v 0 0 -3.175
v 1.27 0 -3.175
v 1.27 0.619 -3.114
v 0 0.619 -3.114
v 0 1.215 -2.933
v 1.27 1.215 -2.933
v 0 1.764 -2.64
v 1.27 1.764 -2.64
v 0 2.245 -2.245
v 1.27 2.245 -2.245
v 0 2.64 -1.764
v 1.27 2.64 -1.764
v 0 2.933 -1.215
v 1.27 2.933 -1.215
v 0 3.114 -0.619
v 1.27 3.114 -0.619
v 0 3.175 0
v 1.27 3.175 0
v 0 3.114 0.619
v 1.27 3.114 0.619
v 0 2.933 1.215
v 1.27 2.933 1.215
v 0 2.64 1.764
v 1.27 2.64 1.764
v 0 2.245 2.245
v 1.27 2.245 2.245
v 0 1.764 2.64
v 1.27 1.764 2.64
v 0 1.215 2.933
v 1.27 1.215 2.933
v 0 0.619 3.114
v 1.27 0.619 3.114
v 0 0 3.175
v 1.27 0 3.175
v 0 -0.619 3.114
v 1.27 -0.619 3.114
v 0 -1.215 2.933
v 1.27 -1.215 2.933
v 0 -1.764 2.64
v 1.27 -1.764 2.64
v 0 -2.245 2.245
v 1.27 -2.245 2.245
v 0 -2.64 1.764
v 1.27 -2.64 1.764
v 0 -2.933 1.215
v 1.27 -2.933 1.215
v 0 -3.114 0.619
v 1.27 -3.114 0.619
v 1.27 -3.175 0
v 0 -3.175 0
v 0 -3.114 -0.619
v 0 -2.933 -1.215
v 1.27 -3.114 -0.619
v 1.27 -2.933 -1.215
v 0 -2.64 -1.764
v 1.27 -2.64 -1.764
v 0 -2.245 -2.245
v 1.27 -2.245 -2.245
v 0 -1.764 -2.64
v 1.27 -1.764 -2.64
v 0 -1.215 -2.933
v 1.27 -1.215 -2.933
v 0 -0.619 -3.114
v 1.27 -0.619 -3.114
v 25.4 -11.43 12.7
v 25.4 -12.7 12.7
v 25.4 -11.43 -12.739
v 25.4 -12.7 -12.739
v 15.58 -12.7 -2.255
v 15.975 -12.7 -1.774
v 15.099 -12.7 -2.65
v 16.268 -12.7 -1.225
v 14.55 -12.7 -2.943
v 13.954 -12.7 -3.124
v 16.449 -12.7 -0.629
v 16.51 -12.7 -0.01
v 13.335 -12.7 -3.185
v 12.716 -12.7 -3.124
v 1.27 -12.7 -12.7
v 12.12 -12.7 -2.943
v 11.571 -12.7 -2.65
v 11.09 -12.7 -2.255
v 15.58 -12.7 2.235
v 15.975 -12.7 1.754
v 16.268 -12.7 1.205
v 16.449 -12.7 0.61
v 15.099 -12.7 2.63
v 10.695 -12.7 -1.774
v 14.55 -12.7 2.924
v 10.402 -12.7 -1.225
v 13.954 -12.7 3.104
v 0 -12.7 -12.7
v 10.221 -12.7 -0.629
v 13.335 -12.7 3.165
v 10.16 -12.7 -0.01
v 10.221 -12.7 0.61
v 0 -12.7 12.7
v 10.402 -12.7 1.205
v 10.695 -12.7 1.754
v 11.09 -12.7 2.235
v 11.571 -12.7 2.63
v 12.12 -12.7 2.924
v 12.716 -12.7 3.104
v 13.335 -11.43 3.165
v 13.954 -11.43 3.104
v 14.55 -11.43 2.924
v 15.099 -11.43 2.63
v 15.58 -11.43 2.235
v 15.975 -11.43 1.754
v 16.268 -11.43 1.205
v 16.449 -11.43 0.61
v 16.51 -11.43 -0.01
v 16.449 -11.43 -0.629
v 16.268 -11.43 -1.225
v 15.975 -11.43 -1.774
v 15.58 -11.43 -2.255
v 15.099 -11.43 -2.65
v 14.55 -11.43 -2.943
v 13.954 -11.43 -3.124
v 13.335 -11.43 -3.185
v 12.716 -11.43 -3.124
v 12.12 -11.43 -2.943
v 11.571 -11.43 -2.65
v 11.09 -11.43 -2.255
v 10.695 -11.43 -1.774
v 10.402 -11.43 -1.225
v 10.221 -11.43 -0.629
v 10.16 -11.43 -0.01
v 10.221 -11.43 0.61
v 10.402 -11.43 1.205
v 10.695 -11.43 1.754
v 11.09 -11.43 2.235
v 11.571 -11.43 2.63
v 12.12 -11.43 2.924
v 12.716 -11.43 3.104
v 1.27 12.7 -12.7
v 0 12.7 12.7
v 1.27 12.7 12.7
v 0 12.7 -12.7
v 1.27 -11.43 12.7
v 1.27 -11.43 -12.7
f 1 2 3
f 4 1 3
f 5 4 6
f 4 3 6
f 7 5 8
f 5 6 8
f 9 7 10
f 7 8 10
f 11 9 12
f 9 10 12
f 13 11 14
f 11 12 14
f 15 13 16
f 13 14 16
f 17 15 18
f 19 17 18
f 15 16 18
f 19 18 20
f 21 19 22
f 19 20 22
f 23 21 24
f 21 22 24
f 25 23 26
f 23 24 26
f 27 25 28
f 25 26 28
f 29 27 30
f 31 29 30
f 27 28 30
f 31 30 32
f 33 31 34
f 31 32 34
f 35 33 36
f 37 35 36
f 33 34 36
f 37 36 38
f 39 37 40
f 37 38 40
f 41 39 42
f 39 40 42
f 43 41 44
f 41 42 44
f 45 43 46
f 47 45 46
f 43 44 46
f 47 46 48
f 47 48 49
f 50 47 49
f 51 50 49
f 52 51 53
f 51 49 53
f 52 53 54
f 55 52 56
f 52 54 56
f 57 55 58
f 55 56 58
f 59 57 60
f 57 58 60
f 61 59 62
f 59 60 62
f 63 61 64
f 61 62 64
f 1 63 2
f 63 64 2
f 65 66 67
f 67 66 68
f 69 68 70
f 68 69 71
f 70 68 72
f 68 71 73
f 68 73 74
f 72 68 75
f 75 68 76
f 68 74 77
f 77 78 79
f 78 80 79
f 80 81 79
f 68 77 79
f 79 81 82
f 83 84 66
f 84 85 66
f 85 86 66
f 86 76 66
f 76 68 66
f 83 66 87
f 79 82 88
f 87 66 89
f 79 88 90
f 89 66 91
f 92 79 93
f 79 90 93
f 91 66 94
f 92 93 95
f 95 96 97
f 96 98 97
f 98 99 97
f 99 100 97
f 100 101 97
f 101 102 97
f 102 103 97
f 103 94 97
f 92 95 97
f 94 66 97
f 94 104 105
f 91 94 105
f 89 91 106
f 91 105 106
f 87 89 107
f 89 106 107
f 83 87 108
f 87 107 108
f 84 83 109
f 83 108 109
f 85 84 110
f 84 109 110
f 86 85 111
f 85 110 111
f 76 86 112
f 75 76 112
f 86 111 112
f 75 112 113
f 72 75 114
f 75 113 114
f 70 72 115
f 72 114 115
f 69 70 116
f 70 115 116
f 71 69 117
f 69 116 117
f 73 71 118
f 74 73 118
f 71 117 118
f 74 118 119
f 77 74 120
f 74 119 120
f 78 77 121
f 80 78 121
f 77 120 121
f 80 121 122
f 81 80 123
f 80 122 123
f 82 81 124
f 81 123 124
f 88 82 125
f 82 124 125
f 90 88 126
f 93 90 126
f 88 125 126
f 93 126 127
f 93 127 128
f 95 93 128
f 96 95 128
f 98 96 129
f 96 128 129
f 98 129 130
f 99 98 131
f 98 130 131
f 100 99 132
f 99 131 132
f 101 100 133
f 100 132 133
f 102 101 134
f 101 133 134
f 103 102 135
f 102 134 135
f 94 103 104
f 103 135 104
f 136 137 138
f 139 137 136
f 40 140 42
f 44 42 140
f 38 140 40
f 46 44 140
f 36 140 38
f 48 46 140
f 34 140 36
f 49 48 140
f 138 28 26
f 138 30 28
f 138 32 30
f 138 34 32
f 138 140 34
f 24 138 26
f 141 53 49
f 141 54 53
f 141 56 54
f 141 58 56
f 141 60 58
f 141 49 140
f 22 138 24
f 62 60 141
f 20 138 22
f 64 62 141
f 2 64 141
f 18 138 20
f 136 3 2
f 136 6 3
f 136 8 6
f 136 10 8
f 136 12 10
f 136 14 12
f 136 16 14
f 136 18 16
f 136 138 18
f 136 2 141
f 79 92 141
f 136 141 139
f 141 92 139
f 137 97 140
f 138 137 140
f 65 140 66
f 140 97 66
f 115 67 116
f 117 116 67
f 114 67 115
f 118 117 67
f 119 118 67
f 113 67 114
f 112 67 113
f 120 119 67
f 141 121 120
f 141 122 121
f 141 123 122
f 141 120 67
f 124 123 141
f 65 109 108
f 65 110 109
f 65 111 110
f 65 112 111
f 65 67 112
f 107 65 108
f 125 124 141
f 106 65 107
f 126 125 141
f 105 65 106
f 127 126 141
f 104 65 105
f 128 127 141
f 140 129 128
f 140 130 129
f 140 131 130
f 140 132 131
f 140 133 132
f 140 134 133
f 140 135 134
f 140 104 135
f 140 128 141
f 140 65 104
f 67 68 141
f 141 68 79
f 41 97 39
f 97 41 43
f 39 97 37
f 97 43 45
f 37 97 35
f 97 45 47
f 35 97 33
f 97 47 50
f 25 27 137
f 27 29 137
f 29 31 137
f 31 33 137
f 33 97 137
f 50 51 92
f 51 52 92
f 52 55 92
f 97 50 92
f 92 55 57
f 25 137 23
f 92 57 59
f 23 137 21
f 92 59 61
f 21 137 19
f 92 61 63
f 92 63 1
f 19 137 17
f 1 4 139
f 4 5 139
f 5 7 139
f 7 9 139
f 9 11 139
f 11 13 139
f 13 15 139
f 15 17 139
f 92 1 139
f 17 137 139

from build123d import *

# Parameters (mm, degrees)
SKETCH1_W           = 25.4
SKETCH1_H           = 25.4
BOSS_EXTRUDE1_DEPTH = 1.27
BOSS_EXTRUDE2_DEPTH = 1.27
SKETCH3_R           = 3.175
CUT_EXTRUDE1_DEPTH  = 1.27
SKETCH4_R           = 3.175
CUT_EXTRUDE2_DEPTH  = 1.27


with BuildPart() as part:
    # Sketch1 → Boss-Extrude1 (new body)
    with BuildSketch(Plane(origin=(0, 0, 0), x_dir=(0, 0, -1), z_dir=(1, 0, 0))):
        Rectangle(SKETCH1_W, SKETCH1_H)
    extrude(amount=BOSS_EXTRUDE1_DEPTH)

    # Sketch2 → Boss-Extrude2 (add)
    with BuildSketch(Plane.XZ.offset(12.7)):
        Polygon((1.27, 12.7), (25.4, 12.7), (25.4, -12.738650011), (1.27, -12.7), align=None)
    extrude(amount=-BOSS_EXTRUDE2_DEPTH)

    # Sketch3 → Cut-Extrude1 (cut)
    with BuildSketch(Plane(origin=(1.27, 0, 0), x_dir=(0, 0, -1), z_dir=(1, 0, 0))):
        Circle(SKETCH3_R)
    extrude(amount=-CUT_EXTRUDE1_DEPTH, mode=Mode.SUBTRACT)

    # Sketch4 → Cut-Extrude2 (cut)
    with BuildSketch(Plane(origin=(0, -11.43, 0), x_dir=(1, 0, 0), z_dir=(0, 1, 0))):
        with Locations(Location((13.335, 0.009662503, 0), (0, 0, 270))):
            Circle(SKETCH4_R)
    extrude(amount=-CUT_EXTRUDE2_DEPTH, mode=Mode.SUBTRACT)


solid = part.part
